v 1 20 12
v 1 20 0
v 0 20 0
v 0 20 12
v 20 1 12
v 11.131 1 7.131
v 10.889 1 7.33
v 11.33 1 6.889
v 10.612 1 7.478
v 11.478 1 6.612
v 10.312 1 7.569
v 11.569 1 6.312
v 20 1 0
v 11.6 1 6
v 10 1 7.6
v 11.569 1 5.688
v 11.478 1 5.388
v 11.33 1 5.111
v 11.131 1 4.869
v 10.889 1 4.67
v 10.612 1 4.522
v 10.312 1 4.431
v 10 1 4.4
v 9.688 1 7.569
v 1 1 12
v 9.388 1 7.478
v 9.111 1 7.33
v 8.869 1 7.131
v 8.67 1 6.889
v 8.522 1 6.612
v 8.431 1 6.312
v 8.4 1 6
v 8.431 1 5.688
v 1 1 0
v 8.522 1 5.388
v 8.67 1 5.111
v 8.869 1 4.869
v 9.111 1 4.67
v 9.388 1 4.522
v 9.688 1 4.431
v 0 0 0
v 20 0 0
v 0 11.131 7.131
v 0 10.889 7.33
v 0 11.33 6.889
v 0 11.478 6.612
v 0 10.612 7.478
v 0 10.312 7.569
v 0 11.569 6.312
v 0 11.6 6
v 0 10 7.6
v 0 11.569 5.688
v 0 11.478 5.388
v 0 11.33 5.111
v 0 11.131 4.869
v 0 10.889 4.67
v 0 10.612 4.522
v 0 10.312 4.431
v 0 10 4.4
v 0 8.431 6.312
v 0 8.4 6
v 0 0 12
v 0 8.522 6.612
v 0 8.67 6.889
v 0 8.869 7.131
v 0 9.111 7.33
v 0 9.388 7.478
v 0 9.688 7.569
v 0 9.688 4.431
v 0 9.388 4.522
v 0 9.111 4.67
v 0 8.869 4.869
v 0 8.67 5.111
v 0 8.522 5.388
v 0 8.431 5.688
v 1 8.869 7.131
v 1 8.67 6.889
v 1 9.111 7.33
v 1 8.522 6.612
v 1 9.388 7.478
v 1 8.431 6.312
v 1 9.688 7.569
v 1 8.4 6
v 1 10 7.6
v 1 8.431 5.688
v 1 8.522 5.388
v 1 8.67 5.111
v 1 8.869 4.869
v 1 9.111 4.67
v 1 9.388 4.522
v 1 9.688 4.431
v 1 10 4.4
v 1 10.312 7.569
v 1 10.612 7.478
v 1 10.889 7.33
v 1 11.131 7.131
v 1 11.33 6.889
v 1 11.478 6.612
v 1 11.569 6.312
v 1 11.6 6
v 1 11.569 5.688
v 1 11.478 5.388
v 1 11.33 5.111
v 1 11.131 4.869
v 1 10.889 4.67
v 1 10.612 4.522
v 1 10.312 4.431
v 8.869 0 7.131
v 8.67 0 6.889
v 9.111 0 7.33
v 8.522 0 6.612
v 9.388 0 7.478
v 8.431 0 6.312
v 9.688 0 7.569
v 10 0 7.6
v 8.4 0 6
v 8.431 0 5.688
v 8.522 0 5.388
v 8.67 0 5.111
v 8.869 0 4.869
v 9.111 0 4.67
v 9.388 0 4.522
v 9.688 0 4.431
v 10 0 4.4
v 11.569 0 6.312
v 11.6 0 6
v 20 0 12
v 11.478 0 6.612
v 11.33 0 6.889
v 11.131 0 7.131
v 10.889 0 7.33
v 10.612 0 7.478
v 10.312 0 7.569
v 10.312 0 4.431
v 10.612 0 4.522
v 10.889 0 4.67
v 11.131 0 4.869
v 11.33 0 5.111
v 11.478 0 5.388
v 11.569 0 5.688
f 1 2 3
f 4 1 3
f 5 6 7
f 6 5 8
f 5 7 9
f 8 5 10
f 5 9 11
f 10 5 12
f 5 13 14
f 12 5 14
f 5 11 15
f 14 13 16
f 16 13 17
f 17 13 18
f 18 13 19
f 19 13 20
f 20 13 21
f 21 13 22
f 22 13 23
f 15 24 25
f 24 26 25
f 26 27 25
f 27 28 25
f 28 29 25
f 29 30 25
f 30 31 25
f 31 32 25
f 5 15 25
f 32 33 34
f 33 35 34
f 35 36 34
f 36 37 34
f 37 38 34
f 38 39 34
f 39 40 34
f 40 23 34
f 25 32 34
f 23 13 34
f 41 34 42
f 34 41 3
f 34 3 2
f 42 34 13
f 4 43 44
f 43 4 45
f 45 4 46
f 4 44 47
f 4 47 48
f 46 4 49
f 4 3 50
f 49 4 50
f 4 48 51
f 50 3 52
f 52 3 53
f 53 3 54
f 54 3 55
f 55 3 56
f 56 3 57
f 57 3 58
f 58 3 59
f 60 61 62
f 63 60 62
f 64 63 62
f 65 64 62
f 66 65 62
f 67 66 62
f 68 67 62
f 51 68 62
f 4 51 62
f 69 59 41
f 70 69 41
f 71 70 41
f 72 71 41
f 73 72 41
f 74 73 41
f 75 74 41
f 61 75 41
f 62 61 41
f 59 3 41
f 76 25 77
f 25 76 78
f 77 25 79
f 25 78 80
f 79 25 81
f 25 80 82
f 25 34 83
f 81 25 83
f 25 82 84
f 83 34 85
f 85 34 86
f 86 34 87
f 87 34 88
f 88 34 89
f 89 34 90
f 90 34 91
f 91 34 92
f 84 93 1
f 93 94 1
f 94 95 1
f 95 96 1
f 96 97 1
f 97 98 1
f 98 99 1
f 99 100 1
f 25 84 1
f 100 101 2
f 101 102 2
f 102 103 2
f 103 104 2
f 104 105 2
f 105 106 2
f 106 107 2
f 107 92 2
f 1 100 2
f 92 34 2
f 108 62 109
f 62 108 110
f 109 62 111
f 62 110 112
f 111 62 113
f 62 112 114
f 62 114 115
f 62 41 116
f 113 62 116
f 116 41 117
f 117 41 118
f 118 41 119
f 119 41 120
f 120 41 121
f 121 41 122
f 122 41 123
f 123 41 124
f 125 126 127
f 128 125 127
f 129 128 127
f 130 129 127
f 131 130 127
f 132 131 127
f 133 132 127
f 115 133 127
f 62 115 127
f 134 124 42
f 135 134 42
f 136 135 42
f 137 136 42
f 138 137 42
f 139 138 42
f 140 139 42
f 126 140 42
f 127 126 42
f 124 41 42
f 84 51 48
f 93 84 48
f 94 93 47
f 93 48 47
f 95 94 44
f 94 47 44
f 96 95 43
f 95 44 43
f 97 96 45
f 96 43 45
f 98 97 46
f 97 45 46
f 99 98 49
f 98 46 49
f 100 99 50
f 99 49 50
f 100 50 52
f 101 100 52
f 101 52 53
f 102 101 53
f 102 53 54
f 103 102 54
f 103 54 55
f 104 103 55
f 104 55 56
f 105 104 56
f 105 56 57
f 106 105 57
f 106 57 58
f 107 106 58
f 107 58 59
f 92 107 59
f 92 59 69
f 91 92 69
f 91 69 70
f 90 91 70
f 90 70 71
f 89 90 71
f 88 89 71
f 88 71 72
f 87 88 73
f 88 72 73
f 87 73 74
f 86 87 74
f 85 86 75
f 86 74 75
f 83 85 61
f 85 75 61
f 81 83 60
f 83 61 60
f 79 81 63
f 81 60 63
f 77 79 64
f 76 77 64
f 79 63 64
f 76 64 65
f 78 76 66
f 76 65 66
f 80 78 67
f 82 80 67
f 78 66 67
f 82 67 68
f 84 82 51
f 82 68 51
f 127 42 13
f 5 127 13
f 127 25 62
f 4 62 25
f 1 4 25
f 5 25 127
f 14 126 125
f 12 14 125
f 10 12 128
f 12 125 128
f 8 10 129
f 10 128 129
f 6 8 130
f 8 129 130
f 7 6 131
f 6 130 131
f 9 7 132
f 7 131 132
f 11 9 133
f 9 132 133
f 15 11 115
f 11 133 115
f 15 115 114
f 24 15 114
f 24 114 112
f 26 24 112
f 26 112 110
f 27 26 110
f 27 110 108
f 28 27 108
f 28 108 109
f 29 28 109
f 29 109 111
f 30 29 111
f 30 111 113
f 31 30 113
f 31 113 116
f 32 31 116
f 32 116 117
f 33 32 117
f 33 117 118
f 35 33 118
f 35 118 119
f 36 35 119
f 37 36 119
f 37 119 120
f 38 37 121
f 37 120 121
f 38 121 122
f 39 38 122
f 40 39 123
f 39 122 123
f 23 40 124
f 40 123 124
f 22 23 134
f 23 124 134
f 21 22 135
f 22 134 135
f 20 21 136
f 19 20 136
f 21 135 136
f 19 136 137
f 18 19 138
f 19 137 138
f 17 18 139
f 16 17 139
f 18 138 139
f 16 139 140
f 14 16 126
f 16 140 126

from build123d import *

# Parameters (mm, degrees)
BOSS_EXTRUDE1_DEPTH = 12
SKETCH2_R           = 1.6
CUT_EXTRUDE1_DEPTH  = 21
SKETCH3_R           = 1.6
CUT_EXTRUDE2_DEPTH  = 21


with BuildPart() as part:
    # Sketch1 → Boss-Extrude1 (new body)
    with BuildSketch(Plane.XY):
        Polygon((0, 0), (20, 0), (20, 1), (1, 1), (1, 20), (0, 20), align=None)
    extrude(amount=BOSS_EXTRUDE1_DEPTH)

    # Sketch2 → Cut-Extrude1 (cut, through all)
    with BuildSketch(Plane.XZ):
        with Locations((10, 6)):
            Circle(SKETCH2_R)
    extrude(amount=-CUT_EXTRUDE1_DEPTH, mode=Mode.SUBTRACT)

    # Sketch3 → Cut-Extrude2 (cut, through all)
    with BuildSketch(Plane.ZY):
        with Locations((6, 10)):
            Circle(SKETCH3_R)
    extrude(amount=-CUT_EXTRUDE2_DEPTH, mode=Mode.SUBTRACT)


solid = part.part
